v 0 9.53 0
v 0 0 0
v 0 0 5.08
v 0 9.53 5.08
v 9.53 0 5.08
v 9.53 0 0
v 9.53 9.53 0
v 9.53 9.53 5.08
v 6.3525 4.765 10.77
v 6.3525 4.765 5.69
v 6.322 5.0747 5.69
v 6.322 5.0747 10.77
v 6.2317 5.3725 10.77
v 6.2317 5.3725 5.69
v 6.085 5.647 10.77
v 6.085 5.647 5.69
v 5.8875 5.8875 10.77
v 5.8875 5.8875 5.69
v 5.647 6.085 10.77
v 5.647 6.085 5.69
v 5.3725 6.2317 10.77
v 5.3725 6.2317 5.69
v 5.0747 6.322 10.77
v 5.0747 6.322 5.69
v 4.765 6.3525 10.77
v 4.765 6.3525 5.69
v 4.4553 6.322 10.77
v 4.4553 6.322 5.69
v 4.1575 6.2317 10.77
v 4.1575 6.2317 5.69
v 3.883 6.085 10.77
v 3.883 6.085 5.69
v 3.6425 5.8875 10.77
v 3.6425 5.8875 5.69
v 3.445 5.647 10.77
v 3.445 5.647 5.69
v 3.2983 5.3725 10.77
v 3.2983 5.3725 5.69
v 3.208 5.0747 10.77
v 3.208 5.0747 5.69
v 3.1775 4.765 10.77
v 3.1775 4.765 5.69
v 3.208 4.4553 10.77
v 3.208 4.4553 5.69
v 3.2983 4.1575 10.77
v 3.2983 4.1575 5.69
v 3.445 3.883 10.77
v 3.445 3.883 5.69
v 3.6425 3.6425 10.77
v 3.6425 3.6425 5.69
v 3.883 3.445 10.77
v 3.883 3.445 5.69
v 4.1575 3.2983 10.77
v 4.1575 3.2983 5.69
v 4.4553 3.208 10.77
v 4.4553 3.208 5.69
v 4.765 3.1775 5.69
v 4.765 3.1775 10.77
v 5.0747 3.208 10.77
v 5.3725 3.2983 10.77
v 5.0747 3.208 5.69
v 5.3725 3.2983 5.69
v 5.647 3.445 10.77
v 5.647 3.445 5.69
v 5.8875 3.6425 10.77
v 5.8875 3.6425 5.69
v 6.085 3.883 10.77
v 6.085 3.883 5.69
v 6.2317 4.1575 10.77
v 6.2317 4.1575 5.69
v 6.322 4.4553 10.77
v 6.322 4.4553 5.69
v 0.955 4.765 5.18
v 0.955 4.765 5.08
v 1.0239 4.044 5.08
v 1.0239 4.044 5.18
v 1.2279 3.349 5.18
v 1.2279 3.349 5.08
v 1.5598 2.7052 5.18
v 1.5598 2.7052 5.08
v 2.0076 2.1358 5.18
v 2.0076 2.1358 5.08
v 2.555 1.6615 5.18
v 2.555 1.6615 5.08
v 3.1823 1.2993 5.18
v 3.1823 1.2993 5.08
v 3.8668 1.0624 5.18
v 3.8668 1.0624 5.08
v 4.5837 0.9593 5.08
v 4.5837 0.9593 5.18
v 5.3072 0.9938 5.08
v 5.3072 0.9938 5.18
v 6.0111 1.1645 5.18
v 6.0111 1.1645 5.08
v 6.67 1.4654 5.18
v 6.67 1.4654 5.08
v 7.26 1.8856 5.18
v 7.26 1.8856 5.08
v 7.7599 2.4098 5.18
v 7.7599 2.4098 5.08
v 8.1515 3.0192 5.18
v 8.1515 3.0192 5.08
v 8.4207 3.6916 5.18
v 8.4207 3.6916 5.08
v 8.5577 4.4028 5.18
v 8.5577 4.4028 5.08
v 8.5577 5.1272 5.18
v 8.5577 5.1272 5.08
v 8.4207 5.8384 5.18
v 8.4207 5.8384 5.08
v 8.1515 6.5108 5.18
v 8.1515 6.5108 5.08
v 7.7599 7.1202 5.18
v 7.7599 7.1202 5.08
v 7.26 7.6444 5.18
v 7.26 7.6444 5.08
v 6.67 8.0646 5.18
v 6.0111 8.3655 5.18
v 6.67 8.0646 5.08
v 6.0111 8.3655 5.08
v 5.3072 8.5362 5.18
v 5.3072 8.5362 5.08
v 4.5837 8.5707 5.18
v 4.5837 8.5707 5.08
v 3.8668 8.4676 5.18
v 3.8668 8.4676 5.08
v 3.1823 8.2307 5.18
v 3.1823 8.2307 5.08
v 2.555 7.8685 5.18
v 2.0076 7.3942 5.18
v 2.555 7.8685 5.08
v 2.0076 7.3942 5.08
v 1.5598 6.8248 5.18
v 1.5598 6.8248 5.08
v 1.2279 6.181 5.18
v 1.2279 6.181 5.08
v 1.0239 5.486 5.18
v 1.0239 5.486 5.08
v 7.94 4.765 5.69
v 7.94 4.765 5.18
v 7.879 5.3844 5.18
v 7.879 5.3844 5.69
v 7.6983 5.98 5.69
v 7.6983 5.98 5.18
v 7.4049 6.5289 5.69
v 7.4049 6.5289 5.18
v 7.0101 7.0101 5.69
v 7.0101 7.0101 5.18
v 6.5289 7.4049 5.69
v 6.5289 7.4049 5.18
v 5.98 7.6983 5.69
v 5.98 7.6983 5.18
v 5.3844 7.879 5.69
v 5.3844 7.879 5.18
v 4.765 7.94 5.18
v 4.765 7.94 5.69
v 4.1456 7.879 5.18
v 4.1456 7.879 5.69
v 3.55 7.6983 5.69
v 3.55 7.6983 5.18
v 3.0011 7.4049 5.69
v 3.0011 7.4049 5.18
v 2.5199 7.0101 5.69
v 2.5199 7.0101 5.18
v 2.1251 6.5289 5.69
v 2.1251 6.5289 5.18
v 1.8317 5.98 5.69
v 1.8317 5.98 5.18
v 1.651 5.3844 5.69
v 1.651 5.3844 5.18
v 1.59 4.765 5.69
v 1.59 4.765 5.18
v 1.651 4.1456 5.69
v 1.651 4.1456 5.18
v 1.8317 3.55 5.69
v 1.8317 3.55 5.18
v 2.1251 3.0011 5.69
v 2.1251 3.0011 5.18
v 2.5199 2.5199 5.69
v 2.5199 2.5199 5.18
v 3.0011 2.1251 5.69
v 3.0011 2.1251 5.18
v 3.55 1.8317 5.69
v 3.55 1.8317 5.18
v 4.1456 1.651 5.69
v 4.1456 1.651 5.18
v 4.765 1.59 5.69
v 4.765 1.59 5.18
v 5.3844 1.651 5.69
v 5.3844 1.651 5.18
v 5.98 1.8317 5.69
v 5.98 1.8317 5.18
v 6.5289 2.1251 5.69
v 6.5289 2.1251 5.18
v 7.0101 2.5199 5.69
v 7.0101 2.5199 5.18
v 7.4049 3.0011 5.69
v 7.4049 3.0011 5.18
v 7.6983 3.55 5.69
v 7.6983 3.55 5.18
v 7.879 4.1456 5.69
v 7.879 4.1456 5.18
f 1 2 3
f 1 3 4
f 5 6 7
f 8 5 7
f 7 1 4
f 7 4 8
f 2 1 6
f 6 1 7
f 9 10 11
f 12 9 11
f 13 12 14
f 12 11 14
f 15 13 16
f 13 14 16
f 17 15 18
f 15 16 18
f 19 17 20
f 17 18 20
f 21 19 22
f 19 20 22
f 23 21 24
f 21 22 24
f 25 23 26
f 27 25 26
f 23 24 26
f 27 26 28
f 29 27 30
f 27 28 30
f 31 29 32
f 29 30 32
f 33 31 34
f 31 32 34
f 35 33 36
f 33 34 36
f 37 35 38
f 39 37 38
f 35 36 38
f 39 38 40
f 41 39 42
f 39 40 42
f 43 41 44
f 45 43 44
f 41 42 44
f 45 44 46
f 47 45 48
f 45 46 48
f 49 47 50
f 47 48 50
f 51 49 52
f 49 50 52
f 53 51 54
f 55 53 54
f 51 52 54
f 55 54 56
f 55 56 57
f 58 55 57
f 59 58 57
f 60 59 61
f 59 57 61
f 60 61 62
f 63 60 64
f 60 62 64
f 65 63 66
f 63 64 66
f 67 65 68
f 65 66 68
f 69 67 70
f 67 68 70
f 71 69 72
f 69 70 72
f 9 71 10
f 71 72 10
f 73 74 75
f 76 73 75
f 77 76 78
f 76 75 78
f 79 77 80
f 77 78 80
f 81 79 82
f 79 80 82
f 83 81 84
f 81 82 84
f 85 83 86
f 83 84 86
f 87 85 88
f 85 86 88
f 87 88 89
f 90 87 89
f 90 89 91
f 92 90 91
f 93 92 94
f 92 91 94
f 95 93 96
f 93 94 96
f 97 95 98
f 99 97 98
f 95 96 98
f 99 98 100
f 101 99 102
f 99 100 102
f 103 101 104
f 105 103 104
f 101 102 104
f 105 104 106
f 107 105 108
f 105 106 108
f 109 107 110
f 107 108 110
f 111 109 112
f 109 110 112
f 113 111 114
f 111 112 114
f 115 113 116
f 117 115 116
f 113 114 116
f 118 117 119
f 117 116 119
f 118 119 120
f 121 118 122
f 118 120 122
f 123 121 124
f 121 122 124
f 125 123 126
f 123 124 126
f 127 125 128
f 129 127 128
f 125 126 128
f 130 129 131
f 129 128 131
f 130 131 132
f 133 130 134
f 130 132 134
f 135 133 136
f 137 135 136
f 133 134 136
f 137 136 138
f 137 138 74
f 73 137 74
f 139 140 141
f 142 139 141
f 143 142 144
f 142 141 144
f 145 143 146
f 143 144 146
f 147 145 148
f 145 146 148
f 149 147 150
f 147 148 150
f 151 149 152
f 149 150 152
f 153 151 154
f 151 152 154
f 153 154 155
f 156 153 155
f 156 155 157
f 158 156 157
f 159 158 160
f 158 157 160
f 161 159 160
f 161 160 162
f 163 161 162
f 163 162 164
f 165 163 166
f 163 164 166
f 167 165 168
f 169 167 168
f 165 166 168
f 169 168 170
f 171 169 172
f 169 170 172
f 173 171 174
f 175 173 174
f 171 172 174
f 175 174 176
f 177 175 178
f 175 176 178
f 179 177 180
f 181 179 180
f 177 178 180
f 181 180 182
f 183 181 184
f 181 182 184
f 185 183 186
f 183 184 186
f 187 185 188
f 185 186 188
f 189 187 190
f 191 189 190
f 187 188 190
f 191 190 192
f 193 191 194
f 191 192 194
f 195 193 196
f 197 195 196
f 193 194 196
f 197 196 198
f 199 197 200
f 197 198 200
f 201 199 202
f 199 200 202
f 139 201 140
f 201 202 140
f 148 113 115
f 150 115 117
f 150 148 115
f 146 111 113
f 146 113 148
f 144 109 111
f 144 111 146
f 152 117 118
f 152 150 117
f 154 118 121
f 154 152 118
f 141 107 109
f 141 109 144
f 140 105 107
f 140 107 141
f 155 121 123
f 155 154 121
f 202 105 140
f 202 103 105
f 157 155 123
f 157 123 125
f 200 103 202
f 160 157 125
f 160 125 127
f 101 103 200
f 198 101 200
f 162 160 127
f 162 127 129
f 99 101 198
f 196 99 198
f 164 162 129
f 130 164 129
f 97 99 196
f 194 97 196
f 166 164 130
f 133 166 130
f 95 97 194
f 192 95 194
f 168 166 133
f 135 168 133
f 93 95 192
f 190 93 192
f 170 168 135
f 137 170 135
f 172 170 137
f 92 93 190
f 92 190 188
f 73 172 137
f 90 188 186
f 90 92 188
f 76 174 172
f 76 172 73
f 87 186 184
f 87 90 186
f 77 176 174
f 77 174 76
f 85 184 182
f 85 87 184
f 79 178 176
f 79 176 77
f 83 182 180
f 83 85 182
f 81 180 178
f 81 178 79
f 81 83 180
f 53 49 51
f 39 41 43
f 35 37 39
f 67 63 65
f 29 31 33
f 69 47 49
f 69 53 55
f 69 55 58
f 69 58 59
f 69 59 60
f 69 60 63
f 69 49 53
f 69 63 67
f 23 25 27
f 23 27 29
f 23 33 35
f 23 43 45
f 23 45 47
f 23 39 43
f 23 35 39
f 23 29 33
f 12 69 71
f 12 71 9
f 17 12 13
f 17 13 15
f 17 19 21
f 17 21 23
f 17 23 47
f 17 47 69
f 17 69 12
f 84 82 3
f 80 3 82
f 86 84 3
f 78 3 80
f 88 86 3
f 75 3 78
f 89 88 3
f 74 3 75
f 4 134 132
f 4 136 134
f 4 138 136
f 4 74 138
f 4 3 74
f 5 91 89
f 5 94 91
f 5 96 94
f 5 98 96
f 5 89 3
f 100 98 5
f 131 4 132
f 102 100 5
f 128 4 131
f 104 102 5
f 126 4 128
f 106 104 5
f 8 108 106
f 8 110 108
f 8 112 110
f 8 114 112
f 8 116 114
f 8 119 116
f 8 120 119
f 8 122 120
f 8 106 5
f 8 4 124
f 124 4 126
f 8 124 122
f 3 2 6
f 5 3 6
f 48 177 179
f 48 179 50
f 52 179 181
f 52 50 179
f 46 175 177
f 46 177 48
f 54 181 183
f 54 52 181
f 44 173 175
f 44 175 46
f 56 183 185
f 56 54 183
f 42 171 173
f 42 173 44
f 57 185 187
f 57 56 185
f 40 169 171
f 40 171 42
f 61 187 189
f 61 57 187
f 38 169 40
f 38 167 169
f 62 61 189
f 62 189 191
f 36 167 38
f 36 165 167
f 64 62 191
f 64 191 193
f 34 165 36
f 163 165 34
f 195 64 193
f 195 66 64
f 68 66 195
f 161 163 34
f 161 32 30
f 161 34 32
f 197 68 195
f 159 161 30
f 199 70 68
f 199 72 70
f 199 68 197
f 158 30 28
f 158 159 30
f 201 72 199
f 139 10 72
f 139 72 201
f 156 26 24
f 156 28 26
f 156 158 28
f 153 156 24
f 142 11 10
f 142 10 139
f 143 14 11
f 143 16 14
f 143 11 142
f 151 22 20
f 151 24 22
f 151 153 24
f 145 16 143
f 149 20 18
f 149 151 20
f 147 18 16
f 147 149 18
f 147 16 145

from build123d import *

# Parameters (mm, degrees)
SKETCH1_W           = 9.53
SKETCH1_H           = 9.53
BOSS_EXTRUDE1_DEPTH = 5.08
SKETCH2_R           = 3.81
BOSS_EXTRUDE2_DEPTH = 0.1
SKETCH3_R           = 3.175
BOSS_EXTRUDE3_DEPTH = 0.51
SKETCH4_R           = 1.5875
BOSS_EXTRUDE4_DEPTH = 5.08


with BuildPart() as part:
    # Sketch1 → Boss-Extrude1 (new body)
    with BuildSketch(Plane.XY):
        with Locations((4.765, 4.765)):
            Rectangle(SKETCH1_W, SKETCH1_H)
    extrude(amount=BOSS_EXTRUDE1_DEPTH)

    # Sketch2 → Boss-Extrude2 (add)
    with BuildSketch(Plane.XY.offset(5.08)):
        with Locations(Location((4.765, 4.765, 0), (0, 0, 180))):
            Circle(SKETCH2_R)
    extrude(amount=BOSS_EXTRUDE2_DEPTH)

    # Sketch3 → Boss-Extrude3 (add)
    with BuildSketch(Plane.XY.offset(5.18)):
        with Locations((4.765, 4.765)):
            Circle(SKETCH3_R)
    extrude(amount=BOSS_EXTRUDE3_DEPTH)

    # Sketch4 → Boss-Extrude4 (add)
    with BuildSketch(Plane.XY.offset(5.69)):
        with Locations((4.765, 4.765)):
            Circle(SKETCH4_R)
    extrude(amount=BOSS_EXTRUDE4_DEPTH)


solid = part.part
